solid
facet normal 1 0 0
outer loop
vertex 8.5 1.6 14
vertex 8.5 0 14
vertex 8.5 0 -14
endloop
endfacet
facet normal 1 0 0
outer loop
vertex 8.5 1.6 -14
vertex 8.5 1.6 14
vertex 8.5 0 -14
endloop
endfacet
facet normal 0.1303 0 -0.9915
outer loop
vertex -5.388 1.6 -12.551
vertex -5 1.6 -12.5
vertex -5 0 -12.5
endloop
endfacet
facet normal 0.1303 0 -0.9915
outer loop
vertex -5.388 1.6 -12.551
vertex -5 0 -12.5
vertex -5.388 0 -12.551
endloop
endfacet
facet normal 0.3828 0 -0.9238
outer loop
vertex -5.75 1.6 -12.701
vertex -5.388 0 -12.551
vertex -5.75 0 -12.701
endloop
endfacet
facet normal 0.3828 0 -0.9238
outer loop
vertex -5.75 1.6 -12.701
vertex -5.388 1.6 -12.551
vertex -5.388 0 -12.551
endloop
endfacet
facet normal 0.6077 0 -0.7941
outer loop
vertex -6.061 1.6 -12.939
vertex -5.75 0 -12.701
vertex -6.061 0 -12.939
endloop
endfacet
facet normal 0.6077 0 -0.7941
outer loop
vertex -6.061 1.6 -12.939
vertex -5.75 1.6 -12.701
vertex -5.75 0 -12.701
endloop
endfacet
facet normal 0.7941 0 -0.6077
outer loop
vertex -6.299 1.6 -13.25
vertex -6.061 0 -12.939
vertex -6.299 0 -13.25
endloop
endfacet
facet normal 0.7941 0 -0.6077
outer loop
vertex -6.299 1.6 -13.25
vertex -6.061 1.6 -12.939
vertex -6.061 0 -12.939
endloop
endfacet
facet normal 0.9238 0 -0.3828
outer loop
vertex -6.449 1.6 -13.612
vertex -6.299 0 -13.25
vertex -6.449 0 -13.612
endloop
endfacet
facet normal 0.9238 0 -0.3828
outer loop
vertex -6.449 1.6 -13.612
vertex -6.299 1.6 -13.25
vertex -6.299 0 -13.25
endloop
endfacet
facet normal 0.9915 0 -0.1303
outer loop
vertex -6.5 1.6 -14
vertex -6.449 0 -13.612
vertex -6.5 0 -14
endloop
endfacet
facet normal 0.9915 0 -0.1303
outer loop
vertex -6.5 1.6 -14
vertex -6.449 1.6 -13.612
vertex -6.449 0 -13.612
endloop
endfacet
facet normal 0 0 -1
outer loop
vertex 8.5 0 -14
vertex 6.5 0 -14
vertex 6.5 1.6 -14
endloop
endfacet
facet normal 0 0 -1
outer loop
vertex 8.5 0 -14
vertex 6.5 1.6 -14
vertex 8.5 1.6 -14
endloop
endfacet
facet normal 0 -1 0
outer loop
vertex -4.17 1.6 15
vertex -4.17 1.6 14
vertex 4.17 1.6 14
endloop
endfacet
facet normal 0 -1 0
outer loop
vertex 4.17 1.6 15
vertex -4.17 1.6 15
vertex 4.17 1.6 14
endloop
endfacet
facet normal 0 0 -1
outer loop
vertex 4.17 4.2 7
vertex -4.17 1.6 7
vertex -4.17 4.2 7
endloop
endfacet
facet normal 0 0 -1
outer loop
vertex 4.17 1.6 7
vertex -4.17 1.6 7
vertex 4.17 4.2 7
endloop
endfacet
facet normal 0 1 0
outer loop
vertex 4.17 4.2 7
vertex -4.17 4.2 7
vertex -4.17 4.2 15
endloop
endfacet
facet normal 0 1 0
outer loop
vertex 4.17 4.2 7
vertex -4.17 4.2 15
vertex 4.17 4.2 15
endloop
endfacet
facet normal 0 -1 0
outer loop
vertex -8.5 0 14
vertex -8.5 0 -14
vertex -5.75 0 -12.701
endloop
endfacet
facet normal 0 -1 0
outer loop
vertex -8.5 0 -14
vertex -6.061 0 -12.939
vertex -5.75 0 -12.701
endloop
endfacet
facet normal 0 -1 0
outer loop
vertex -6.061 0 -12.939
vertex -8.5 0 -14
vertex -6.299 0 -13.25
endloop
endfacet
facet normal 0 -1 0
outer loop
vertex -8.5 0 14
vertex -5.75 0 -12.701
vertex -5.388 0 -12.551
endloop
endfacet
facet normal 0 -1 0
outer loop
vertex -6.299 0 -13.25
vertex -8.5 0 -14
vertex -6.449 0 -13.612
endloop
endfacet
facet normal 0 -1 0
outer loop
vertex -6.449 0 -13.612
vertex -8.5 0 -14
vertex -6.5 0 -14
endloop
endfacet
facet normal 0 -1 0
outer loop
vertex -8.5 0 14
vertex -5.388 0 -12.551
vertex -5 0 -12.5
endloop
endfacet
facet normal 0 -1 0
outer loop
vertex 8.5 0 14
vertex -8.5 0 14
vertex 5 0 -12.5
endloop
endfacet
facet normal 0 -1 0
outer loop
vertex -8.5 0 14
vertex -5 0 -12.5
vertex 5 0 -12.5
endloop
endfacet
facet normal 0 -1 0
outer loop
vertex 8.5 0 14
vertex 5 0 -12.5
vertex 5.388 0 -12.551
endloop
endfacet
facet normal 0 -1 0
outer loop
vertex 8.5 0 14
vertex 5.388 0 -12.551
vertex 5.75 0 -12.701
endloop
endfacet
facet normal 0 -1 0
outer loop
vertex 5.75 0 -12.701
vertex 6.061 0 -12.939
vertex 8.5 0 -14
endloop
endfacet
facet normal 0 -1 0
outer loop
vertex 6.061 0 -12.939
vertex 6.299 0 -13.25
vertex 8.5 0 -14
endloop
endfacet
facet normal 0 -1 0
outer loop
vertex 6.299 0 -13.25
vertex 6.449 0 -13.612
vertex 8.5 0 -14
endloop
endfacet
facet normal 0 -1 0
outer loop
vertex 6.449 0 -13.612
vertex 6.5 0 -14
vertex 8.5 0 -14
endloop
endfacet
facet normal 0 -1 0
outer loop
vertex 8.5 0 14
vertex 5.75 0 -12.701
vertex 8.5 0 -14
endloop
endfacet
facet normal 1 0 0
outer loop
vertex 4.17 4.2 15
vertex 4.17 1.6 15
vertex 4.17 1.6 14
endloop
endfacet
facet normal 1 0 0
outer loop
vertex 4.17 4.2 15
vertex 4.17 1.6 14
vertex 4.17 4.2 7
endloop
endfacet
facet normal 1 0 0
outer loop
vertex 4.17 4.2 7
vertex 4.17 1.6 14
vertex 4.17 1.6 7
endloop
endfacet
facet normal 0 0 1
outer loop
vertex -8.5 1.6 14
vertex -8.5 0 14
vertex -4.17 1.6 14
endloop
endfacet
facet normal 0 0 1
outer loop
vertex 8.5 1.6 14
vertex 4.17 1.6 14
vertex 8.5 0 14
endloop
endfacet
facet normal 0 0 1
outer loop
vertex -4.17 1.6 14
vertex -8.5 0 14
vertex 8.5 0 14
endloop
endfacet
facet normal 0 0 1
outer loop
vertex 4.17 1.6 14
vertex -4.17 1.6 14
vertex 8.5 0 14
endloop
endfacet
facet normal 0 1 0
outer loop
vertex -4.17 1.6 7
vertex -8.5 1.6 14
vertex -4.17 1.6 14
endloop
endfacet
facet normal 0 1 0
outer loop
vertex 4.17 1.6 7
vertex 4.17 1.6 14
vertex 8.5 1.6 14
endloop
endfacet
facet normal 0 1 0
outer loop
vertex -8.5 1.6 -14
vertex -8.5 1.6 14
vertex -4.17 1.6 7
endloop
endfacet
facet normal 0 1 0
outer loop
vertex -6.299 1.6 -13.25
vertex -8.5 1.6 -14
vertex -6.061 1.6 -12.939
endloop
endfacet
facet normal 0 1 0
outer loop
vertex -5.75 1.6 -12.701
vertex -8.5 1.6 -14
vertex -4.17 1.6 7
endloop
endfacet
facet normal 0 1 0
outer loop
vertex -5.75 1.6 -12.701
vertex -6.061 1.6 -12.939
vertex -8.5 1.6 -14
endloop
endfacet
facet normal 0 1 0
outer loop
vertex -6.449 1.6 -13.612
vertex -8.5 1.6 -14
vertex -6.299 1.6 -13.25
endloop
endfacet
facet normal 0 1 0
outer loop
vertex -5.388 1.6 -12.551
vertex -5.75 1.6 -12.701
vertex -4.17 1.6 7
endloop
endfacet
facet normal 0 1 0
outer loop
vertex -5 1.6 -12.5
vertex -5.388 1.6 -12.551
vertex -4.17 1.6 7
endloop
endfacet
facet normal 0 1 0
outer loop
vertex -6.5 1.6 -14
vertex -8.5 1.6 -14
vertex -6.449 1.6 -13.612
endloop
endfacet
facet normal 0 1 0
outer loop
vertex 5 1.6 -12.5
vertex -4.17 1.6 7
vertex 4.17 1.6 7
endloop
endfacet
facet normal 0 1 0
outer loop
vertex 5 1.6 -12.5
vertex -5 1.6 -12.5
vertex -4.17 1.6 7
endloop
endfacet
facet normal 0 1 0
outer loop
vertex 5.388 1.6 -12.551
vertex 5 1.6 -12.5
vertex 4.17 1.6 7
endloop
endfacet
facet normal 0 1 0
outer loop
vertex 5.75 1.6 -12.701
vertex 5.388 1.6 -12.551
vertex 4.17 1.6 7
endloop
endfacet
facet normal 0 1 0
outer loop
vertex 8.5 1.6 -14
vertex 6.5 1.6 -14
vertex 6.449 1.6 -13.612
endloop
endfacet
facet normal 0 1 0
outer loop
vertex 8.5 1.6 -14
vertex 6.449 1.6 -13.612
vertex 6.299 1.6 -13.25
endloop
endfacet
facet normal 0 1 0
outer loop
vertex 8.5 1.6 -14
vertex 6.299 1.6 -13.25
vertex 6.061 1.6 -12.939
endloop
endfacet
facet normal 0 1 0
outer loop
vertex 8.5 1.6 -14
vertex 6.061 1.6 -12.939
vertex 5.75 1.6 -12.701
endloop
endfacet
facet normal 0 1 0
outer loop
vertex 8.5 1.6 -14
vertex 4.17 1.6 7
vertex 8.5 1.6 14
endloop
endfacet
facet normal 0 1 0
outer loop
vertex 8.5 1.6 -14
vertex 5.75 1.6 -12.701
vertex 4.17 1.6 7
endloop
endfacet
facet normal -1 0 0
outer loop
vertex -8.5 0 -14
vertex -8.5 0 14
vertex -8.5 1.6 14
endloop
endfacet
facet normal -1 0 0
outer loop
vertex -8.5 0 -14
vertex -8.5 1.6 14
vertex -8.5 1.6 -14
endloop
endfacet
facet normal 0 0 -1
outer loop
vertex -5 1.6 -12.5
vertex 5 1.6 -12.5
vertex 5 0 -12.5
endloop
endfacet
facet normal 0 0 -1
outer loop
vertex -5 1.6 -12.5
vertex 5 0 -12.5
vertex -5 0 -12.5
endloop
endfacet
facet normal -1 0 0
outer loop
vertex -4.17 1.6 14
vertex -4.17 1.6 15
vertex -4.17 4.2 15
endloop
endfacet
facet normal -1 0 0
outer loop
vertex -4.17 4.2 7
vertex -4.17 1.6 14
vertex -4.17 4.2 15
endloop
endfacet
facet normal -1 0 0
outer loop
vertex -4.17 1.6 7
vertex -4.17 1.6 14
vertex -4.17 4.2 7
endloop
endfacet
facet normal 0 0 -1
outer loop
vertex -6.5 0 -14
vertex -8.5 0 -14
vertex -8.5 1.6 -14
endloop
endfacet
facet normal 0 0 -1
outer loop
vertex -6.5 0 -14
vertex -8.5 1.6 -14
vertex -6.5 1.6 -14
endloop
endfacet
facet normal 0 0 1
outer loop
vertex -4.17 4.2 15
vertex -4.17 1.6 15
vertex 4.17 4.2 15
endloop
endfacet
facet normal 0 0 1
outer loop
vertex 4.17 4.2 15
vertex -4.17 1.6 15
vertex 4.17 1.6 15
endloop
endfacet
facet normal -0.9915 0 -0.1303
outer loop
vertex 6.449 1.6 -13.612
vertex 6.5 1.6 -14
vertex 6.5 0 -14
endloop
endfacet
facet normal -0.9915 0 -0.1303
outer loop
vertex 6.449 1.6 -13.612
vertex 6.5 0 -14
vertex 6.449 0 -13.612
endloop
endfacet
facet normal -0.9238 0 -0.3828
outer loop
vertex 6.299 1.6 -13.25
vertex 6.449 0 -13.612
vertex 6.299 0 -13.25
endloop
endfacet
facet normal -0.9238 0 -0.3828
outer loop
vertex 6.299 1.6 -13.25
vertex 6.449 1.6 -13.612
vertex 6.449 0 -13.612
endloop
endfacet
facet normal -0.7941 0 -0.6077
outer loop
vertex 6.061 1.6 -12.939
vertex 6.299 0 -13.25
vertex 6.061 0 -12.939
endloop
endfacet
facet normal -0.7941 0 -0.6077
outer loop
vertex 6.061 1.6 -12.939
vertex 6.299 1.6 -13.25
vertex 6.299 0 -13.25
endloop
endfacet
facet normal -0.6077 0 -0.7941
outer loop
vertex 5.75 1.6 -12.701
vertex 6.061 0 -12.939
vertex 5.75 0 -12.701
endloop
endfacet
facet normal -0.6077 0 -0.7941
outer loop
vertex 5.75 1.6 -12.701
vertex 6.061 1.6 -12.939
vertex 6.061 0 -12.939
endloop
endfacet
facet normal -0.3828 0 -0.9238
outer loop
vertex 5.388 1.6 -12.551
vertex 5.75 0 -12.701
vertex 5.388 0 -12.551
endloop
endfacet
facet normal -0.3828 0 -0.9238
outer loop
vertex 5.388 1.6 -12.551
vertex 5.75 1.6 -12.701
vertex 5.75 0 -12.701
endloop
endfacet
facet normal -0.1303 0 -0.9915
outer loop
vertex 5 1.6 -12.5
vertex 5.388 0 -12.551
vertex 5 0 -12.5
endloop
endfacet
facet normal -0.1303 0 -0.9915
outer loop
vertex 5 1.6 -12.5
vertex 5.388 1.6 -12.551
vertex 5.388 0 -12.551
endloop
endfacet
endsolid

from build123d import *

# Parameters (mm, degrees)
SKETCH1_W           = 17
SKETCH1_H           = 28
BOSS_EXTRUDE1_DEPTH = 1.6
SKETCH2_W           = 8.34
SKETCH2_H           = 8
BOSS_EXTRUDE2_DEPTH = 2.6
CUT_EXTRUDE1_DEPTH  = 18.435882541


with BuildPart() as part:
    # Sketch1 → Boss-Extrude1 (new body)
    with BuildSketch(Plane(origin=(0, 0, 0), x_dir=(1, 0, 0), z_dir=(0, 1, 0))):
        Rectangle(SKETCH1_W, SKETCH1_H)
    extrude(amount=BOSS_EXTRUDE1_DEPTH)

    # Sketch2 → Boss-Extrude2 (add)
    with BuildSketch(Plane(origin=(0, 1.6, 0), x_dir=(1, 0, 0), z_dir=(0, 1, 0))):
        with Locations((0, -11)):
            Rectangle(SKETCH2_W, SKETCH2_H)
    extrude(amount=BOSS_EXTRUDE2_DEPTH)

    # Sketch3 → Cut-Extrude1 (cut, through all)
    with BuildSketch(Plane(origin=(0, 1.6, 0), x_dir=(1, 0, 0), z_dir=(0, 1, 0))):
        with BuildLine():
            Line((-5, 15.5), (5, 15.5))
            ThreePointArc((5, 15.5), (6.5, 14), (5, 12.5))
            Line((5, 12.5), (-5, 12.5))
            ThreePointArc((-5, 12.5), (-6.5, 14), (-5, 15.5))
        make_face()
    extrude(amount=-CUT_EXTRUDE1_DEPTH, mode=Mode.SUBTRACT)


solid = part.part
